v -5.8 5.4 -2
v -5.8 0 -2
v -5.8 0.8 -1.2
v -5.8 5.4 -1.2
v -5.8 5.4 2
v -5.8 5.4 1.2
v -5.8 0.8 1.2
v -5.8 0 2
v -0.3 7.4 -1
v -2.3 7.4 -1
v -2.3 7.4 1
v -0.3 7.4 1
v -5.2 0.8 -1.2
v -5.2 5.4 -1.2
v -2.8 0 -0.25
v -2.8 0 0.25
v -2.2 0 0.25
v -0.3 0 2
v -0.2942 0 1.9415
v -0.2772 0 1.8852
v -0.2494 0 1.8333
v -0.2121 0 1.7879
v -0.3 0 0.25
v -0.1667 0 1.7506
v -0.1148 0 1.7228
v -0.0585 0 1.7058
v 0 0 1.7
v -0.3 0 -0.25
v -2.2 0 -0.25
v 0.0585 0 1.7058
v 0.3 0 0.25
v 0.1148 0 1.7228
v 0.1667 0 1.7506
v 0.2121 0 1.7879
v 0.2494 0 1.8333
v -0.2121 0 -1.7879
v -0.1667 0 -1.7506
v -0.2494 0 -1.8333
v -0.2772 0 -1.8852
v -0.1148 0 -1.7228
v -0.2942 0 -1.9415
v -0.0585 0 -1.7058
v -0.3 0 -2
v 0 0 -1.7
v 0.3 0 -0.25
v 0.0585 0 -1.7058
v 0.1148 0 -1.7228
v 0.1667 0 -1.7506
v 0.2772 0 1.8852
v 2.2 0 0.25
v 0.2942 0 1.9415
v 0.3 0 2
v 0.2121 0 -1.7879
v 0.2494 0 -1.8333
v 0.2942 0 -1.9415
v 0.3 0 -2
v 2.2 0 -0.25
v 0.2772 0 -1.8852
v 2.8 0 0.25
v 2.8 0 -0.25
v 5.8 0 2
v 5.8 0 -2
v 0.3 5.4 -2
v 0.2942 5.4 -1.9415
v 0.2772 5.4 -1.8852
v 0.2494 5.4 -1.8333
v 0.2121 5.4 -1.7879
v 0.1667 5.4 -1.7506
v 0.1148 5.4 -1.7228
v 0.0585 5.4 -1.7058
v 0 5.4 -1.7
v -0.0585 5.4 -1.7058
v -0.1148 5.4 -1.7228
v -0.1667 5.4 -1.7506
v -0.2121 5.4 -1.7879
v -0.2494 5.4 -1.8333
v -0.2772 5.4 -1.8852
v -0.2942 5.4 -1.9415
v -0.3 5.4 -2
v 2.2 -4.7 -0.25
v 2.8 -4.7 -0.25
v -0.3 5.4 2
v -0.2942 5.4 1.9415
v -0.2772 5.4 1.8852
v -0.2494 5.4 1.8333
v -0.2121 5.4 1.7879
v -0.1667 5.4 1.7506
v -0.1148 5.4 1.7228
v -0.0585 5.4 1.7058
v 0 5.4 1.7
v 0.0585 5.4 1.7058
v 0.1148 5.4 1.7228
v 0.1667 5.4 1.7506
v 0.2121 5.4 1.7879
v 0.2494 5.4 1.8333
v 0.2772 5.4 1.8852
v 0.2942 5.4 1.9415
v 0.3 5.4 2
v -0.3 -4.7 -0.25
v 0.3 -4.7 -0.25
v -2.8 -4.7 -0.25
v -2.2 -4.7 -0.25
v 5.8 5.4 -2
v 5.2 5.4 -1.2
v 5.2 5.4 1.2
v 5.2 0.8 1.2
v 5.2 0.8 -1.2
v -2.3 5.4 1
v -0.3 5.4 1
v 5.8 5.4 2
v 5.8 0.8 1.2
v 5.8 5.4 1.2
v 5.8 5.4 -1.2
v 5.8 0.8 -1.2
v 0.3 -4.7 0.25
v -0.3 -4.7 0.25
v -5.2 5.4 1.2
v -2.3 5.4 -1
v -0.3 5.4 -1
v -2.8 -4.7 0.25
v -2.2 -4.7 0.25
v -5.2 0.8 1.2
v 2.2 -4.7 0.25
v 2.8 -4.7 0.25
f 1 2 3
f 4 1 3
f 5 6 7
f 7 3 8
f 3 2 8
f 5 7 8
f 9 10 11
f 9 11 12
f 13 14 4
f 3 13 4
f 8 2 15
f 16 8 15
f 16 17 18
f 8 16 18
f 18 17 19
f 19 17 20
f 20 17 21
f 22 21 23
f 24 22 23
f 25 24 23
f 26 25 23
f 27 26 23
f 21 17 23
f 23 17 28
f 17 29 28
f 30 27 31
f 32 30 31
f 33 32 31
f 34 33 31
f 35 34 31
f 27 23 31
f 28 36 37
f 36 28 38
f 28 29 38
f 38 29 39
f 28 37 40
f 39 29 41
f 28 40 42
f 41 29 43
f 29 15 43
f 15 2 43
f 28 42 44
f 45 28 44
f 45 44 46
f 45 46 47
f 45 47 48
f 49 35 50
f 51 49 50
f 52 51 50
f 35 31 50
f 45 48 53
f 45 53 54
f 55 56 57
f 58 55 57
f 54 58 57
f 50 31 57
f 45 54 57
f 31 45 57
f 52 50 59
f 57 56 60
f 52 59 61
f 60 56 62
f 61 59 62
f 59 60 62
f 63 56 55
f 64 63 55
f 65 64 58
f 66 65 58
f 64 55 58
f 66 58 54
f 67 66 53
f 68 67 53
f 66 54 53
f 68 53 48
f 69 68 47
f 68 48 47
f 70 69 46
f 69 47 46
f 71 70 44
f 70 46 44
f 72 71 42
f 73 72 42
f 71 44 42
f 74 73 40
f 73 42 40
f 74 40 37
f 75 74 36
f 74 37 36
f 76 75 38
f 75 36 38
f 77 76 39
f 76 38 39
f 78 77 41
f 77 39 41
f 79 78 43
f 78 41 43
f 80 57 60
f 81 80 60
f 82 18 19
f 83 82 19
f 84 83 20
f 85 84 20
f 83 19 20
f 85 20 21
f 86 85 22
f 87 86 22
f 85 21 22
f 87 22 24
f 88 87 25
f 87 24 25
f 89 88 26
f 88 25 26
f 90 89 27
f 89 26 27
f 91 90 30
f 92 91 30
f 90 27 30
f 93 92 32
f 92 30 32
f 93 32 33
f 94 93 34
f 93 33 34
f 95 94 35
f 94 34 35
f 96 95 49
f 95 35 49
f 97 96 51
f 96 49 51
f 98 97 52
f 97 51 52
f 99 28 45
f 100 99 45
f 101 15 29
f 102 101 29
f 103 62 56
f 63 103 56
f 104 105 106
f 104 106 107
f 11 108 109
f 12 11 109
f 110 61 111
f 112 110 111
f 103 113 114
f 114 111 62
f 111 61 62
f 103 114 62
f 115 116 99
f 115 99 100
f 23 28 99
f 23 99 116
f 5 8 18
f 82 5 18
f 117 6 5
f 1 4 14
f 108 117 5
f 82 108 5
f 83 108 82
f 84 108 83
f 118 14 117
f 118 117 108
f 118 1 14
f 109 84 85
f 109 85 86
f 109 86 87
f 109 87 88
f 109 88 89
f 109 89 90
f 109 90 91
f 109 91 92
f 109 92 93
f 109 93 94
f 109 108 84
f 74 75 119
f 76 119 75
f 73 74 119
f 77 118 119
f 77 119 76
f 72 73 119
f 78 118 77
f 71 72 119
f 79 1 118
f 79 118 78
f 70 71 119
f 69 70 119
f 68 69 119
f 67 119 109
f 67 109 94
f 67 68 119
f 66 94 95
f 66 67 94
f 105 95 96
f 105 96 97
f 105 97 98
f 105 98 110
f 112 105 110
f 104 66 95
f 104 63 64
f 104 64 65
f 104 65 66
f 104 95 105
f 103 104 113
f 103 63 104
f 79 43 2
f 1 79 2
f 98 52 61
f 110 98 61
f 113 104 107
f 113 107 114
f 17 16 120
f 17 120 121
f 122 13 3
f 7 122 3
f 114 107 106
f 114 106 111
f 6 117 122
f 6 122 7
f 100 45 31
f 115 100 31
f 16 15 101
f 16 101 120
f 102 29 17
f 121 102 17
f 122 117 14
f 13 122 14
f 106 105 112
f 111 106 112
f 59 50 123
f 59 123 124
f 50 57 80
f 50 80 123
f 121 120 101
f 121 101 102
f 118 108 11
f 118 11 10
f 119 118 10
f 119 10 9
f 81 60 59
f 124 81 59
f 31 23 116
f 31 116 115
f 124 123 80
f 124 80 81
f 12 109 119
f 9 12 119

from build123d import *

# Parameters (mm, degrees)
BOSS_EXTRUDE1_DEPTH = 5.4
SKETCH3_W           = 0.6
SKETCH3_H           = 0.5
BOSS_EXTRUDE3_DEPTH = 4.7
SKETCH4_W           = 2
SKETCH4_H           = 2
BOSS_EXTRUDE4_DEPTH = 2
SKETCH5_W           = 1.2
SKETCH5_H           = 2.4
CUT_EXTRUDE1_DEPTH  = 4.6


with BuildPart() as part:
    # Sketch1 → Boss-Extrude1 (new body)
    with BuildSketch(Plane(origin=(0, 0, 0), x_dir=(1, 0, 0), z_dir=(0, 1, 0))):
        with BuildLine():
            Line((-5.8, -2), (-0.3, -2))
            ThreePointArc((-0.3, -2), (0, -1.7), (0.3, -2))
            Line((0.3, -2), (5.8, -2))
            Line((5.8, -2), (5.8, 2))
            Line((5.8, 2), (0.3, 2))
            ThreePointArc((0.3, 2), (0, 1.7), (-0.3, 2))
            Line((-0.3, 2), (-5.8, 2))
            Line((-5.8, 2), (-5.8, -2))
        make_face()
    extrude(amount=BOSS_EXTRUDE1_DEPTH)

    # Sketch3 → Boss-Extrude3 (add)
    with BuildSketch(Plane.XZ):
        Rectangle(SKETCH3_W, SKETCH3_H)
        with Locations((2.5, 0)):
            Rectangle(SKETCH3_W, SKETCH3_H)
        with Locations((-2.5, 0)):
            Rectangle(SKETCH3_W, SKETCH3_H)
    extrude(amount=BOSS_EXTRUDE3_DEPTH)

    # Sketch4 → Boss-Extrude4 (add)
    with BuildSketch(Plane(origin=(0, 5.4, 0), x_dir=(1, 0, 0), z_dir=(0, 1, 0))):
        with Locations((-1.3, 0)):
            Rectangle(SKETCH4_W, SKETCH4_H)
    extrude(amount=BOSS_EXTRUDE4_DEPTH)

    # Sketch5 → Cut-Extrude1 (cut)
    with BuildSketch(Plane(origin=(0, 5.4, 0), x_dir=(1, 0, 0), z_dir=(0, 1, 0))):
        with Locations((5.8, 0)):
            Rectangle(SKETCH5_W, SKETCH5_H)
    cut_extrude1 = extrude(amount=-CUT_EXTRUDE1_DEPTH, mode=Mode.SUBTRACT)

    # Mirror1: Cut-Extrude1 across plane
    add(cut_extrude1.mirror(Plane(origin=(0, 0, 0), x_dir=(0, 0, 1), z_dir=(1, 0, 0))), mode=Mode.SUBTRACT)


solid = part.part
